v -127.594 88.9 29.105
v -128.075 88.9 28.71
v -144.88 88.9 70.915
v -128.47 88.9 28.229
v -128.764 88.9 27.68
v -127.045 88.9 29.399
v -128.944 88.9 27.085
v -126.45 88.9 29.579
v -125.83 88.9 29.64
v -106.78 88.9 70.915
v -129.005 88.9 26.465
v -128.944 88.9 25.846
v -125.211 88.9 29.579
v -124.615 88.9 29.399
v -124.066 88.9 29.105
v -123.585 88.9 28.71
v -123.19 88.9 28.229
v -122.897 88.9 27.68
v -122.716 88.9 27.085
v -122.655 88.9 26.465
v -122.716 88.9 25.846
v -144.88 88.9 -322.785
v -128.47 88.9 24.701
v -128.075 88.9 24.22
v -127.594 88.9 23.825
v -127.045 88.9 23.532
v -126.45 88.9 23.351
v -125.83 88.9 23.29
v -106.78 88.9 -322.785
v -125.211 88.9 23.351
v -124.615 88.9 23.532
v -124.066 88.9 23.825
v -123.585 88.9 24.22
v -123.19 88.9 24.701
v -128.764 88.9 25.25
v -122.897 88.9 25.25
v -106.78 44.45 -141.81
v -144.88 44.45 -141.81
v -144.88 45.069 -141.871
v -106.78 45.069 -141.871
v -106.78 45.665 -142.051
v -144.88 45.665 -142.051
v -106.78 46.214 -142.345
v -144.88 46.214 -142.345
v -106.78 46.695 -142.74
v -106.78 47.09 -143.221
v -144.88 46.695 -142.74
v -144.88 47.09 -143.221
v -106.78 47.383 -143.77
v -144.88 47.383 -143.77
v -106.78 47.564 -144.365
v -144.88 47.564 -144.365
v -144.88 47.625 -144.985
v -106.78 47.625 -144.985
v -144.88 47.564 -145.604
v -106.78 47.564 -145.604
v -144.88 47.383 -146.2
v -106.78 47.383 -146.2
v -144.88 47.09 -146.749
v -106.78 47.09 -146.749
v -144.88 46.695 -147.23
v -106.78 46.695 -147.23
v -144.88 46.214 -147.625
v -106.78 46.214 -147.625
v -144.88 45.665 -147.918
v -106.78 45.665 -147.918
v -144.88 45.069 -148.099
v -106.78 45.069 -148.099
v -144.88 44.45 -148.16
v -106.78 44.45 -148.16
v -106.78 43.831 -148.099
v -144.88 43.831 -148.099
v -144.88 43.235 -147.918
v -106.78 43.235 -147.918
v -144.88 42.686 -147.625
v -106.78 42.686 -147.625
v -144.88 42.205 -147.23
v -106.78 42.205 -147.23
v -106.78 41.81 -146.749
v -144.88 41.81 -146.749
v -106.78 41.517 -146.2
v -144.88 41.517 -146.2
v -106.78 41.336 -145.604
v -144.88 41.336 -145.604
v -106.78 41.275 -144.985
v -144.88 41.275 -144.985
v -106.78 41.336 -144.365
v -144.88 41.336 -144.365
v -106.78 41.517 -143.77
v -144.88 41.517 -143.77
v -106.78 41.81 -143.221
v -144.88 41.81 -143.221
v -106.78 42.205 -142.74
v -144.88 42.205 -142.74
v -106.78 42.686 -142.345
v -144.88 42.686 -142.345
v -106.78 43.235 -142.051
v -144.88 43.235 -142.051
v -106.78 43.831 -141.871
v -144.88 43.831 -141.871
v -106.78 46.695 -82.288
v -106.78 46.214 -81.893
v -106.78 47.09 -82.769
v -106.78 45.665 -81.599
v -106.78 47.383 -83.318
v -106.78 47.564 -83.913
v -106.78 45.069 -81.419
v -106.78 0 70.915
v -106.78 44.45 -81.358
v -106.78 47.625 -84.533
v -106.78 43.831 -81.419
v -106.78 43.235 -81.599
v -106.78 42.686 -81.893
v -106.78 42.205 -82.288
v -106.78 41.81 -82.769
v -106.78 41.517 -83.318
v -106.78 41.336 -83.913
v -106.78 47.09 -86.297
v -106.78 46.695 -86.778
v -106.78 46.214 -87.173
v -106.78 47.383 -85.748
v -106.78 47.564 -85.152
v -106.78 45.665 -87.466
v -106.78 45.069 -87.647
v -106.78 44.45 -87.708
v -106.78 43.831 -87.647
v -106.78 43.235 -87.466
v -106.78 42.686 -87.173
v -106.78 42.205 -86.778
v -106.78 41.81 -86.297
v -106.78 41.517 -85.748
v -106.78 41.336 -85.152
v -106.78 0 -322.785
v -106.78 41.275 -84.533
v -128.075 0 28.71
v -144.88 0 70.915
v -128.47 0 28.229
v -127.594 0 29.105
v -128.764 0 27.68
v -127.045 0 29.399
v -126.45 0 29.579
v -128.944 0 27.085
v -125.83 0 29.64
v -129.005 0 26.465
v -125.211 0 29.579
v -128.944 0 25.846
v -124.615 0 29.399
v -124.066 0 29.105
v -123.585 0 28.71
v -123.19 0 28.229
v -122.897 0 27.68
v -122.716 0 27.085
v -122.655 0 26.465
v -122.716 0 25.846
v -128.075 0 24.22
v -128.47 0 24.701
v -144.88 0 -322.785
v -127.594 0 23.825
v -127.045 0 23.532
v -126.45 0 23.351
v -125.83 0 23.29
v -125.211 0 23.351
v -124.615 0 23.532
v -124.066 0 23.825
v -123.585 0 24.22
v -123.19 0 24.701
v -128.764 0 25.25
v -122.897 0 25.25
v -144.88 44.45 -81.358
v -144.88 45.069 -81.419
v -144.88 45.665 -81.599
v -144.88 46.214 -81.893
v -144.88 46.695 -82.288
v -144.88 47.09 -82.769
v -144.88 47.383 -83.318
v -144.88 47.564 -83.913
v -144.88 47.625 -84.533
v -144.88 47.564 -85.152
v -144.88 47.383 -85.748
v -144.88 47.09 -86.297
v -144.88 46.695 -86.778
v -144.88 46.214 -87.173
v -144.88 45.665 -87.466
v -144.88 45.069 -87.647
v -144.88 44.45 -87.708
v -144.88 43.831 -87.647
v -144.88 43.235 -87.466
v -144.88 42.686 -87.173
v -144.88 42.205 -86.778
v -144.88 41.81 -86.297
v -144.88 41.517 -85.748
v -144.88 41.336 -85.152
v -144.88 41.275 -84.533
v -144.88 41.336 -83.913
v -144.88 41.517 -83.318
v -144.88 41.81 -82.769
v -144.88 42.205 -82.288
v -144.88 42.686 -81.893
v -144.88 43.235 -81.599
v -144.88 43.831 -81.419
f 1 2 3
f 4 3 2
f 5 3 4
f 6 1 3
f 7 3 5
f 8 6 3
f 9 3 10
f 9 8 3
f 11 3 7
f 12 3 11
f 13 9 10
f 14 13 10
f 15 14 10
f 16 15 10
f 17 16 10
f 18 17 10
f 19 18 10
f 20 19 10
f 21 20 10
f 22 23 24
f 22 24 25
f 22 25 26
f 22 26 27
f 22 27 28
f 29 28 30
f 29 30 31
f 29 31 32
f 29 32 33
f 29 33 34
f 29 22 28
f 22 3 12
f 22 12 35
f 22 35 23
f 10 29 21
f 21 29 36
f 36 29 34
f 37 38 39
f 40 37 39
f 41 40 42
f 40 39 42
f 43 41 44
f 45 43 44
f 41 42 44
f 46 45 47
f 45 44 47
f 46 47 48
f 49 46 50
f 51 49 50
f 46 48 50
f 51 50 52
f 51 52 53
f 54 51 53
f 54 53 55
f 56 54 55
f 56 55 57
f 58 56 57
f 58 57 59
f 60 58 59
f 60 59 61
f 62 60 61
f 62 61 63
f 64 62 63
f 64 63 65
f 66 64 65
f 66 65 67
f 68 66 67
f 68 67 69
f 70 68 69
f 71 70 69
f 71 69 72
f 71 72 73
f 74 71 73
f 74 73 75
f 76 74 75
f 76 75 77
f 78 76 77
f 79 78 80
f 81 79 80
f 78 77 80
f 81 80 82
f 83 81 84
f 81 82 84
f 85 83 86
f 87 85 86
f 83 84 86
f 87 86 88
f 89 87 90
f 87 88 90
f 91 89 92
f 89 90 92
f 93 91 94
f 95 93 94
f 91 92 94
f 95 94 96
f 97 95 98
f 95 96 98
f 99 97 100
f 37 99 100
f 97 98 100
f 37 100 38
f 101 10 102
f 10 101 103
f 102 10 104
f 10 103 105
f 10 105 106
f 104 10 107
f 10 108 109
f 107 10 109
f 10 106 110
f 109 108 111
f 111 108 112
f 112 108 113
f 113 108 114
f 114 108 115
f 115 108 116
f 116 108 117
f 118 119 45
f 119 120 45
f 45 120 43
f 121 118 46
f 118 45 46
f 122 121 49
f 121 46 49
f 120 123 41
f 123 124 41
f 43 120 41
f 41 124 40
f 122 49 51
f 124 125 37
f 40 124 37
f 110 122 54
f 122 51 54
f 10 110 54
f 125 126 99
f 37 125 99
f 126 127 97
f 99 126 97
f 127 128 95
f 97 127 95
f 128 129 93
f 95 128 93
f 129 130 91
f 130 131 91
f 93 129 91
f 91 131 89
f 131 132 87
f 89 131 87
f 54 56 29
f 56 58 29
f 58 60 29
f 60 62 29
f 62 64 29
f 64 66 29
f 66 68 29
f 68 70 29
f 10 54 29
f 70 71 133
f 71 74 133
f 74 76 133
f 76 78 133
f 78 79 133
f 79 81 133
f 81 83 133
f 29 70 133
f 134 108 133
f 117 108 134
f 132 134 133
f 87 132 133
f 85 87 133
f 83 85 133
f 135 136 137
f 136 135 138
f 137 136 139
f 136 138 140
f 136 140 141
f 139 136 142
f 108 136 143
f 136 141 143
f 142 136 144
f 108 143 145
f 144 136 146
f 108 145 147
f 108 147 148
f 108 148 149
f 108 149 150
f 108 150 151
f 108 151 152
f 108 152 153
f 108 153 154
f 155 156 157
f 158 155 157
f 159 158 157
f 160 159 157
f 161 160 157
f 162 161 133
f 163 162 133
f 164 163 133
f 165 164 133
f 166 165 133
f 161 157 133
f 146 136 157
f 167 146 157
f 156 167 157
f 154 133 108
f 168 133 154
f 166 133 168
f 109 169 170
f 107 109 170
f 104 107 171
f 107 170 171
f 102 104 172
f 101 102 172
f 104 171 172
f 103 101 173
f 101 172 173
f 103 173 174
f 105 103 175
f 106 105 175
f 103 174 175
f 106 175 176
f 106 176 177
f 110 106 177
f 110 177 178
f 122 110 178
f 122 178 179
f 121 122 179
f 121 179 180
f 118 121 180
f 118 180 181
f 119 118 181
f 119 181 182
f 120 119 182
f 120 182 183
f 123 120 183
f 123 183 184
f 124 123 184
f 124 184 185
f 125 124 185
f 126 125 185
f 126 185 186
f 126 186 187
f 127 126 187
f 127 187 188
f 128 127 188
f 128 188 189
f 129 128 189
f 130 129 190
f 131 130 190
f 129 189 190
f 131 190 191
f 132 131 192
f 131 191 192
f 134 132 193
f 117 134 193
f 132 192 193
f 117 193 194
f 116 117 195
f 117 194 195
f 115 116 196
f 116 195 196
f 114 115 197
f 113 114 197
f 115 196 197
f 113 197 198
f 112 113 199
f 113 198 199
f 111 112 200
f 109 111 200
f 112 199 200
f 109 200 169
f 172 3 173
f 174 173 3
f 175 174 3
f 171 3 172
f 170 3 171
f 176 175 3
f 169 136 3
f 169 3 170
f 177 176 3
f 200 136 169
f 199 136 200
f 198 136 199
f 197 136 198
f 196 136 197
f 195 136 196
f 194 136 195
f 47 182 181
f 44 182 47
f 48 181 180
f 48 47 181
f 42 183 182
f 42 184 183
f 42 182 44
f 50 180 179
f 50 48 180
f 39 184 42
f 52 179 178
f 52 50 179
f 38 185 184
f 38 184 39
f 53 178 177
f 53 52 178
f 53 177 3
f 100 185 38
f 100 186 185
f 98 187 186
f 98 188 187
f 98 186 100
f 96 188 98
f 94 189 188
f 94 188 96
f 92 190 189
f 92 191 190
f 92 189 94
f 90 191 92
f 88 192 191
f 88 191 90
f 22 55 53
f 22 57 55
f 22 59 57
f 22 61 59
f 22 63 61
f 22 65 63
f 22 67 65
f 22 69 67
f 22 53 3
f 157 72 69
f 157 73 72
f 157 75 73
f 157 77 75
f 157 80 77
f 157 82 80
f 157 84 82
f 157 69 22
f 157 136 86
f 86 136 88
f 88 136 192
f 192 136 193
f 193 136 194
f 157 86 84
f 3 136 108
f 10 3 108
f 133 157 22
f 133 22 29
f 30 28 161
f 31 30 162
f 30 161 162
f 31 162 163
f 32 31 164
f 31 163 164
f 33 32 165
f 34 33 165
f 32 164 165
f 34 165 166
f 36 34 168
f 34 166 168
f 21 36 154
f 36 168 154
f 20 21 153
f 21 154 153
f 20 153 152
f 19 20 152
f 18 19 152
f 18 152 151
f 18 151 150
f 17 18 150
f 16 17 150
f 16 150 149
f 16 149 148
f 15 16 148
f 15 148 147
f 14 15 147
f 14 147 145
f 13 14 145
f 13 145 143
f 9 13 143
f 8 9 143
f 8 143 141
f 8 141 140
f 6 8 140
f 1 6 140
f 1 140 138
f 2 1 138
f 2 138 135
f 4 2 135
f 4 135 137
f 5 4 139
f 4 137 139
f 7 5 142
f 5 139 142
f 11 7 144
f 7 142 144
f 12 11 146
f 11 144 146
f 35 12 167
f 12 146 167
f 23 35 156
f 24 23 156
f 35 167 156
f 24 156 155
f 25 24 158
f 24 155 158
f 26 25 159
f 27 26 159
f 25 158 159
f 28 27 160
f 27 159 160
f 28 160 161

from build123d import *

# Parameters (mm, degrees)
SKETCH1_W           = 38.1
SKETCH1_H           = 393.7
BOSS_EXTRUDE1_DEPTH = 88.9
SKETCH3_R           = 3.175
CUT_EXTRUDE2_DEPTH  = 337.964070937
SKETCH2_R           = 3.175
CUT_EXTRUDE3_DEPTH  = 365.806065952


with BuildPart() as part:
    # Sketch1 → Boss-Extrude1 (new body)
    with BuildSketch(Plane(origin=(0, 0, 0), x_dir=(1, 0, 0), z_dir=(0, 1, 0))):
        with Locations((-125.830263158, 125.934703947)):
            Rectangle(SKETCH1_W, SKETCH1_H)
    extrude(amount=BOSS_EXTRUDE1_DEPTH)

    # Sketch3 → Cut-Extrude2 (cut, through all)
    with BuildSketch(Plane.ZY.offset(144.880263158)):
        with Locations((-84.532703947, 44.45)):
            Circle(SKETCH3_R)
        with Locations((-144.984703947, 44.45)):
            Circle(SKETCH3_R)
    extrude(amount=-CUT_EXTRUDE2_DEPTH, mode=Mode.SUBTRACT)

    # Sketch2 → Cut-Extrude3 (cut, through all)
    with BuildSketch(Plane(origin=(0, 0, 0), x_dir=(-1, 0, 0), z_dir=(0, -1, 0))):
        with Locations(Location((125.830263158, -26.465296053, 0), (0, 0, 90))):
            Circle(SKETCH2_R)
    extrude(amount=-CUT_EXTRUDE3_DEPTH, mode=Mode.SUBTRACT)


solid = part.part
